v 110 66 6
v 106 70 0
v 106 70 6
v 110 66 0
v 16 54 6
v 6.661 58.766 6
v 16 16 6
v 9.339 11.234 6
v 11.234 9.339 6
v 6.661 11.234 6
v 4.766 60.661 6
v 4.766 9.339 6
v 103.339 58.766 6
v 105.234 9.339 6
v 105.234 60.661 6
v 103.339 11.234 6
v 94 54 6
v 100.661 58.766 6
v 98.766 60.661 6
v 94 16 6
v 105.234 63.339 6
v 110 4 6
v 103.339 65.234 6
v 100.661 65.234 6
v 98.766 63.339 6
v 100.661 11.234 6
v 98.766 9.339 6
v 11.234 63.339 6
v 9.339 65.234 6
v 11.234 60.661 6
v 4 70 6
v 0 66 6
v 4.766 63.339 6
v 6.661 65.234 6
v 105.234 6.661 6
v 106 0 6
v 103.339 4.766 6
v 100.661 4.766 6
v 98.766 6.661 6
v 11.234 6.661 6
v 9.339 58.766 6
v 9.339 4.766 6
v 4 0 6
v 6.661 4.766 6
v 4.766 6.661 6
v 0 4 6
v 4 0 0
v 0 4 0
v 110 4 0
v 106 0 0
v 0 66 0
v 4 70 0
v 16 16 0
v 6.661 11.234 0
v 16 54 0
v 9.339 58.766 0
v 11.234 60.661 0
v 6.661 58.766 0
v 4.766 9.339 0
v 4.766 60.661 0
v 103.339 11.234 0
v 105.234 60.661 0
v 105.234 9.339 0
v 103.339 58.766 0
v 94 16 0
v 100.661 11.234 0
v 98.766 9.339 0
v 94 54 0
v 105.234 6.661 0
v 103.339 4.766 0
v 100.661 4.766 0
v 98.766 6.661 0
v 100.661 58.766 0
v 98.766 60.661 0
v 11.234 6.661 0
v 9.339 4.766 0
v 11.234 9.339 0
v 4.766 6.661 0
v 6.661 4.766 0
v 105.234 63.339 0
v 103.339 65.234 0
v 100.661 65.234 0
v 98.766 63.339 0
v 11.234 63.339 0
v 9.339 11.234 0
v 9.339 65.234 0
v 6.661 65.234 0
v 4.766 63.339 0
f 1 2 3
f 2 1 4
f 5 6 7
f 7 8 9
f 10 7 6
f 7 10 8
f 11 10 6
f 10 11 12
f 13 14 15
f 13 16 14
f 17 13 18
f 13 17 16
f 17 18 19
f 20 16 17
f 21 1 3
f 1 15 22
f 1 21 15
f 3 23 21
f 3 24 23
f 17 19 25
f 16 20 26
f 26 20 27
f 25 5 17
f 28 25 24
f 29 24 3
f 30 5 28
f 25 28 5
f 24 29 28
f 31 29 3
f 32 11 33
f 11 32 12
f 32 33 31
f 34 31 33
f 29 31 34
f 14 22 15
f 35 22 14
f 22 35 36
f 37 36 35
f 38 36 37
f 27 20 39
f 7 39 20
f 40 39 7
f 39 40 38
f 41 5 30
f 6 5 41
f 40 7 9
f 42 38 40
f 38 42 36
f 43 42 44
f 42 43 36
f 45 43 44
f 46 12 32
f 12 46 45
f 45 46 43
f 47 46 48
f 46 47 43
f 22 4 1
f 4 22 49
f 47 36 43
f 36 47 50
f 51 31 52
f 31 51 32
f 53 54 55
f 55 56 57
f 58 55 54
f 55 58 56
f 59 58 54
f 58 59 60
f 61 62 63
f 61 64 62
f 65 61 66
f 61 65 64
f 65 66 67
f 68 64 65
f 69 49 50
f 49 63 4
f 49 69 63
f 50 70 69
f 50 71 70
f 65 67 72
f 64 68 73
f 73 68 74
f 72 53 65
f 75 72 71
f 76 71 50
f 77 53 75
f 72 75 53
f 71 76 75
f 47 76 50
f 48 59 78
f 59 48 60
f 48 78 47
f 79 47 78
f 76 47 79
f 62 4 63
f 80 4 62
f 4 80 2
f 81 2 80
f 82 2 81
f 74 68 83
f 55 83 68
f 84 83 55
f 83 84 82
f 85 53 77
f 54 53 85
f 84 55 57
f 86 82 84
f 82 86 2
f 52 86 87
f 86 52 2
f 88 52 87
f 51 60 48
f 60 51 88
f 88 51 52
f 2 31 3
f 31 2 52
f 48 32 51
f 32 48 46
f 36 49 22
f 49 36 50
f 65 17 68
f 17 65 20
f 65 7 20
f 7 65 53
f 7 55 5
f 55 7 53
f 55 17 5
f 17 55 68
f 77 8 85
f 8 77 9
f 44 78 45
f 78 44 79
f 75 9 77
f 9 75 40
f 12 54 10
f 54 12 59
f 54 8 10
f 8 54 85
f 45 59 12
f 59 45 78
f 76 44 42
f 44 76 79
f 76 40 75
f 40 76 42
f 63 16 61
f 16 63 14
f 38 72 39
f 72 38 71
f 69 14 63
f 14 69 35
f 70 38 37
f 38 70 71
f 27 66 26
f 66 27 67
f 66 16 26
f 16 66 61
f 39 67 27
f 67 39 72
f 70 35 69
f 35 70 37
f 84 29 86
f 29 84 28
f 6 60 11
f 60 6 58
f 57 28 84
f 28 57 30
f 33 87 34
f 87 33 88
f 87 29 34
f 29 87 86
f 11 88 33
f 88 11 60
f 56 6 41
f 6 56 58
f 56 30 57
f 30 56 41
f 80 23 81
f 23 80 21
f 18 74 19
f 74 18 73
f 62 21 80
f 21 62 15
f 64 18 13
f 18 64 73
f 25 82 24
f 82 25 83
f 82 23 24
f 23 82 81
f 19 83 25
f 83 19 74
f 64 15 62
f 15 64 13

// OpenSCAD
$fn = 32;

// ----------------------------------------------------------------------
// Frame plate: 110 x 70 frame, 16 mm rails
// ----------------------------------------------------------------------

// --- parameters (mm) ---
plate_l = 110;            // plate length, X
plate_w = 70;             // plate width, Y
plate_t = 6;              // plate thickness, Z (extrusion height)
corner_c = 4;             // corner chamfer
frame_bar = 16;           // frame rail width
bolt_r = 3.5;             // corner bolt window radius
bolt_inset = 8;           // bolt centre inset from the edges

win_l = plate_l - 2 * frame_bar;  // window length
win_w = plate_w - 2 * frame_bar;  // window width
bolt_d = 2 * bolt_r;  // corner hole diameter

profile = [[4, 0], [106, 0], [110, 4], [110, 66], [106, 70], [4, 70], [0, 66], [0, 4]];  // primary outline, 8 points, counter clockwise
void_1 = [[16, 16], [94, 16], [94, 54], [16, 54]];  // the window, 4 points
void_2 = [[11.234, 9.339], [9.339, 11.234], [6.661, 11.234], [4.766, 9.339], [4.766, 6.661], [6.661, 4.766], [9.339, 4.766], [11.234, 6.661]];  // corner bolt window, 8 points
void_3 = [[105.234, 9.339], [103.339, 11.234], [100.661, 11.234], [98.766, 9.339], [98.766, 6.661], [100.661, 4.766], [103.339, 4.766], [105.234, 6.661]];  // corner bolt window, 8 points
void_4 = [[11.234, 63.339], [9.339, 65.234], [6.661, 65.234], [4.766, 63.339], [4.766, 60.661], [6.661, 58.766], [9.339, 58.766], [11.234, 60.661]];  // corner bolt window, 8 points
void_5 = [[105.234, 63.339], [103.339, 65.234], [100.661, 65.234], [98.766, 63.339], [98.766, 60.661], [100.661, 58.766], [103.339, 58.766], [105.234, 60.661]];  // corner bolt window, 8 points

// --- the one profile operation ---
difference() {
  linear_extrude(height = plate_t) polygon(points = profile);
  translate([0, 0, -1])
    linear_extrude(height = plate_t + 2) polygon(points = void_1);
  translate([0, 0, -1])
    linear_extrude(height = plate_t + 2) polygon(points = void_2);
  translate([0, 0, -1])
    linear_extrude(height = plate_t + 2) polygon(points = void_3);
  translate([0, 0, -1])
    linear_extrude(height = plate_t + 2) polygon(points = void_4);
  translate([0, 0, -1])
    linear_extrude(height = plate_t + 2) polygon(points = void_5);
}
